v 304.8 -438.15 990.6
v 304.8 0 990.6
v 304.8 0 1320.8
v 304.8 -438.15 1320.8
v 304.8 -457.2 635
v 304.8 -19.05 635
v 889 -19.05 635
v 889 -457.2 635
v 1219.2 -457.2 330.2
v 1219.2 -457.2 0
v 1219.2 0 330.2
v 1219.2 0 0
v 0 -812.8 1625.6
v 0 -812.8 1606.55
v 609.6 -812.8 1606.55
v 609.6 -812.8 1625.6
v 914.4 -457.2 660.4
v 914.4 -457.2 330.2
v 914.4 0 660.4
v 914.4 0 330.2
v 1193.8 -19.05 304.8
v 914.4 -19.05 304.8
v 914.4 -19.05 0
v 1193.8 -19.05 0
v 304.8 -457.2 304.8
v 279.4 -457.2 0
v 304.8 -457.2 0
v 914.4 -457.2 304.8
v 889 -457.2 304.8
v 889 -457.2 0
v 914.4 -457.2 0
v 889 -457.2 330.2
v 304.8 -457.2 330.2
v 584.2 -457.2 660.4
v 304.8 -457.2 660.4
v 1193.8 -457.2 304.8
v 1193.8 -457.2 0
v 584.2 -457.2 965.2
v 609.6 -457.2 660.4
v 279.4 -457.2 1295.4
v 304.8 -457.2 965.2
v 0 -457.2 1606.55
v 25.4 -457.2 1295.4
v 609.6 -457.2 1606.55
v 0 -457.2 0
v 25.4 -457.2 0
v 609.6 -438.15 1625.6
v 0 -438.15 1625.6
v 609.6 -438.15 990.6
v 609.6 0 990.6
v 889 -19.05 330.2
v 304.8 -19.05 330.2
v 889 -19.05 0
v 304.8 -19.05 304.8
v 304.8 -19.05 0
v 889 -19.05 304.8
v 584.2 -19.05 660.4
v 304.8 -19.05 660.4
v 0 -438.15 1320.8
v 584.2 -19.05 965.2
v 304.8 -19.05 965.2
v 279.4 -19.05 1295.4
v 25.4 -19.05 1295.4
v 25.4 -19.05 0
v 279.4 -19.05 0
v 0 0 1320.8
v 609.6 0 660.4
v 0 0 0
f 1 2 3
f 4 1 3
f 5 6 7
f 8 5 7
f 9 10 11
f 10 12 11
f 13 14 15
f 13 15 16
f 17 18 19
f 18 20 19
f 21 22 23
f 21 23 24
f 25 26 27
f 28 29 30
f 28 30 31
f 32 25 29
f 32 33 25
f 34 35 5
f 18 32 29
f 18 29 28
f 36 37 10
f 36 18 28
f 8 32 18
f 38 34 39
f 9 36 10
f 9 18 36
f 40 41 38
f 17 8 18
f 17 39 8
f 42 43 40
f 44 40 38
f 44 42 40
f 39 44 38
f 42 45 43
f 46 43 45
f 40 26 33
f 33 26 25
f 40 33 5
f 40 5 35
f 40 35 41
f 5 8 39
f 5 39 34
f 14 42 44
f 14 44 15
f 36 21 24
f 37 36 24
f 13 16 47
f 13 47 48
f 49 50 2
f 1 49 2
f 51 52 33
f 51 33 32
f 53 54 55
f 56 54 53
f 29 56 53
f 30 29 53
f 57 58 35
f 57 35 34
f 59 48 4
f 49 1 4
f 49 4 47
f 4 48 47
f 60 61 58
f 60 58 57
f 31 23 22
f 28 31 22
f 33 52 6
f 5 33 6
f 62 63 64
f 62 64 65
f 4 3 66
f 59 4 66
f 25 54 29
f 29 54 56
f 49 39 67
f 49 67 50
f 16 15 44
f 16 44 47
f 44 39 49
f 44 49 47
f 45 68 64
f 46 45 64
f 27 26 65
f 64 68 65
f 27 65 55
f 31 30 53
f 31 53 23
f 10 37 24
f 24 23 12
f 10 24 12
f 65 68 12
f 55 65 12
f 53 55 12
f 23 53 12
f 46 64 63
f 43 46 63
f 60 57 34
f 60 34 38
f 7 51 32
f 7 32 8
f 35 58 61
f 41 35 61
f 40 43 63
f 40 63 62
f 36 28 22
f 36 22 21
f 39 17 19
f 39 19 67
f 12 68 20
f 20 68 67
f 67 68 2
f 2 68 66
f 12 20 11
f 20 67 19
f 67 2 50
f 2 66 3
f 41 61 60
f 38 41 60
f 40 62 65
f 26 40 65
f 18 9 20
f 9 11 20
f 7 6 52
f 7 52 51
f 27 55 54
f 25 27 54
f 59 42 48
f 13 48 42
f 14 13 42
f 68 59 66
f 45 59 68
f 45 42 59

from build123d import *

# Parameters (mm, degrees)
F1_DEPTH = 19.05
F2_W     = 584.2
F2_H     = 304.8
F2_W_2   = 279.4
F3_DEPTH = 438.15
F5_DEPTH = 19.05
F6_W     = 374.65
F6_H     = 19.05
F7_DEPTH = 609.6


with BuildPart() as f1:
    # F0 (on Front) → F1 (new body)
    with BuildSketch(Plane.XZ):
        Polygon((0, 1320.8), (0, 0), (1219.2, 0), (1219.2, 330.2), (914.4, 330.2), (914.4, 660.4), (609.6, 660.4), (609.6, 990.6), (304.8, 990.6), (304.8, 1320.8), align=None)
    extrude(amount=F1_DEPTH)

    # F2 (on face) → F3 (join)
    with BuildSketch(Plane.XZ.offset(19.05)):
        Polygon((1193.8, 0), (1219.2, 0), (1219.2, 330.2), (914.4, 330.2), (914.4, 660.4), (609.6, 660.4), (609.6, 990.6), (304.8, 990.6), (304.8, 1320.8), (0, 1320.8), (0, 0), (25.4, 0), (25.4, 1295.4), (279.4, 1295.4), (279.4, 0), (304.8, 0), (304.8, 304.8), (889, 304.8), (889, 0), (914.4, 0), (914.4, 304.8), (1193.8, 304.8), align=None)
        with Locations((596.9, 482.6)):
            Rectangle(F2_W, F2_H, mode=Mode.SUBTRACT)
        with Locations((444.5, 812.8)):
            Rectangle(F2_W_2, F2_H, mode=Mode.SUBTRACT)
    extrude(amount=F3_DEPTH)

    # F4 (on face) → F5 (join)
    with BuildSketch(Plane.XZ.offset(457.2)):
        Polygon((609.6, 990.6), (609.6, 1625.6), (0, 1625.6), (0, 1320.8), (304.8, 1320.8), (304.8, 990.6), align=None)
    extrude(amount=-F5_DEPTH)

    # F6 (on face) → F7 (join, through all)
    with BuildSketch(Plane(origin=(0, 0, 0), x_dir=(0, -1, 0), z_dir=(-1, 0, 0))):
        with Locations((625.475, 1616.075)):
            Rectangle(F6_W, F6_H)
    extrude(amount=-F7_DEPTH)


solid = f1.part
